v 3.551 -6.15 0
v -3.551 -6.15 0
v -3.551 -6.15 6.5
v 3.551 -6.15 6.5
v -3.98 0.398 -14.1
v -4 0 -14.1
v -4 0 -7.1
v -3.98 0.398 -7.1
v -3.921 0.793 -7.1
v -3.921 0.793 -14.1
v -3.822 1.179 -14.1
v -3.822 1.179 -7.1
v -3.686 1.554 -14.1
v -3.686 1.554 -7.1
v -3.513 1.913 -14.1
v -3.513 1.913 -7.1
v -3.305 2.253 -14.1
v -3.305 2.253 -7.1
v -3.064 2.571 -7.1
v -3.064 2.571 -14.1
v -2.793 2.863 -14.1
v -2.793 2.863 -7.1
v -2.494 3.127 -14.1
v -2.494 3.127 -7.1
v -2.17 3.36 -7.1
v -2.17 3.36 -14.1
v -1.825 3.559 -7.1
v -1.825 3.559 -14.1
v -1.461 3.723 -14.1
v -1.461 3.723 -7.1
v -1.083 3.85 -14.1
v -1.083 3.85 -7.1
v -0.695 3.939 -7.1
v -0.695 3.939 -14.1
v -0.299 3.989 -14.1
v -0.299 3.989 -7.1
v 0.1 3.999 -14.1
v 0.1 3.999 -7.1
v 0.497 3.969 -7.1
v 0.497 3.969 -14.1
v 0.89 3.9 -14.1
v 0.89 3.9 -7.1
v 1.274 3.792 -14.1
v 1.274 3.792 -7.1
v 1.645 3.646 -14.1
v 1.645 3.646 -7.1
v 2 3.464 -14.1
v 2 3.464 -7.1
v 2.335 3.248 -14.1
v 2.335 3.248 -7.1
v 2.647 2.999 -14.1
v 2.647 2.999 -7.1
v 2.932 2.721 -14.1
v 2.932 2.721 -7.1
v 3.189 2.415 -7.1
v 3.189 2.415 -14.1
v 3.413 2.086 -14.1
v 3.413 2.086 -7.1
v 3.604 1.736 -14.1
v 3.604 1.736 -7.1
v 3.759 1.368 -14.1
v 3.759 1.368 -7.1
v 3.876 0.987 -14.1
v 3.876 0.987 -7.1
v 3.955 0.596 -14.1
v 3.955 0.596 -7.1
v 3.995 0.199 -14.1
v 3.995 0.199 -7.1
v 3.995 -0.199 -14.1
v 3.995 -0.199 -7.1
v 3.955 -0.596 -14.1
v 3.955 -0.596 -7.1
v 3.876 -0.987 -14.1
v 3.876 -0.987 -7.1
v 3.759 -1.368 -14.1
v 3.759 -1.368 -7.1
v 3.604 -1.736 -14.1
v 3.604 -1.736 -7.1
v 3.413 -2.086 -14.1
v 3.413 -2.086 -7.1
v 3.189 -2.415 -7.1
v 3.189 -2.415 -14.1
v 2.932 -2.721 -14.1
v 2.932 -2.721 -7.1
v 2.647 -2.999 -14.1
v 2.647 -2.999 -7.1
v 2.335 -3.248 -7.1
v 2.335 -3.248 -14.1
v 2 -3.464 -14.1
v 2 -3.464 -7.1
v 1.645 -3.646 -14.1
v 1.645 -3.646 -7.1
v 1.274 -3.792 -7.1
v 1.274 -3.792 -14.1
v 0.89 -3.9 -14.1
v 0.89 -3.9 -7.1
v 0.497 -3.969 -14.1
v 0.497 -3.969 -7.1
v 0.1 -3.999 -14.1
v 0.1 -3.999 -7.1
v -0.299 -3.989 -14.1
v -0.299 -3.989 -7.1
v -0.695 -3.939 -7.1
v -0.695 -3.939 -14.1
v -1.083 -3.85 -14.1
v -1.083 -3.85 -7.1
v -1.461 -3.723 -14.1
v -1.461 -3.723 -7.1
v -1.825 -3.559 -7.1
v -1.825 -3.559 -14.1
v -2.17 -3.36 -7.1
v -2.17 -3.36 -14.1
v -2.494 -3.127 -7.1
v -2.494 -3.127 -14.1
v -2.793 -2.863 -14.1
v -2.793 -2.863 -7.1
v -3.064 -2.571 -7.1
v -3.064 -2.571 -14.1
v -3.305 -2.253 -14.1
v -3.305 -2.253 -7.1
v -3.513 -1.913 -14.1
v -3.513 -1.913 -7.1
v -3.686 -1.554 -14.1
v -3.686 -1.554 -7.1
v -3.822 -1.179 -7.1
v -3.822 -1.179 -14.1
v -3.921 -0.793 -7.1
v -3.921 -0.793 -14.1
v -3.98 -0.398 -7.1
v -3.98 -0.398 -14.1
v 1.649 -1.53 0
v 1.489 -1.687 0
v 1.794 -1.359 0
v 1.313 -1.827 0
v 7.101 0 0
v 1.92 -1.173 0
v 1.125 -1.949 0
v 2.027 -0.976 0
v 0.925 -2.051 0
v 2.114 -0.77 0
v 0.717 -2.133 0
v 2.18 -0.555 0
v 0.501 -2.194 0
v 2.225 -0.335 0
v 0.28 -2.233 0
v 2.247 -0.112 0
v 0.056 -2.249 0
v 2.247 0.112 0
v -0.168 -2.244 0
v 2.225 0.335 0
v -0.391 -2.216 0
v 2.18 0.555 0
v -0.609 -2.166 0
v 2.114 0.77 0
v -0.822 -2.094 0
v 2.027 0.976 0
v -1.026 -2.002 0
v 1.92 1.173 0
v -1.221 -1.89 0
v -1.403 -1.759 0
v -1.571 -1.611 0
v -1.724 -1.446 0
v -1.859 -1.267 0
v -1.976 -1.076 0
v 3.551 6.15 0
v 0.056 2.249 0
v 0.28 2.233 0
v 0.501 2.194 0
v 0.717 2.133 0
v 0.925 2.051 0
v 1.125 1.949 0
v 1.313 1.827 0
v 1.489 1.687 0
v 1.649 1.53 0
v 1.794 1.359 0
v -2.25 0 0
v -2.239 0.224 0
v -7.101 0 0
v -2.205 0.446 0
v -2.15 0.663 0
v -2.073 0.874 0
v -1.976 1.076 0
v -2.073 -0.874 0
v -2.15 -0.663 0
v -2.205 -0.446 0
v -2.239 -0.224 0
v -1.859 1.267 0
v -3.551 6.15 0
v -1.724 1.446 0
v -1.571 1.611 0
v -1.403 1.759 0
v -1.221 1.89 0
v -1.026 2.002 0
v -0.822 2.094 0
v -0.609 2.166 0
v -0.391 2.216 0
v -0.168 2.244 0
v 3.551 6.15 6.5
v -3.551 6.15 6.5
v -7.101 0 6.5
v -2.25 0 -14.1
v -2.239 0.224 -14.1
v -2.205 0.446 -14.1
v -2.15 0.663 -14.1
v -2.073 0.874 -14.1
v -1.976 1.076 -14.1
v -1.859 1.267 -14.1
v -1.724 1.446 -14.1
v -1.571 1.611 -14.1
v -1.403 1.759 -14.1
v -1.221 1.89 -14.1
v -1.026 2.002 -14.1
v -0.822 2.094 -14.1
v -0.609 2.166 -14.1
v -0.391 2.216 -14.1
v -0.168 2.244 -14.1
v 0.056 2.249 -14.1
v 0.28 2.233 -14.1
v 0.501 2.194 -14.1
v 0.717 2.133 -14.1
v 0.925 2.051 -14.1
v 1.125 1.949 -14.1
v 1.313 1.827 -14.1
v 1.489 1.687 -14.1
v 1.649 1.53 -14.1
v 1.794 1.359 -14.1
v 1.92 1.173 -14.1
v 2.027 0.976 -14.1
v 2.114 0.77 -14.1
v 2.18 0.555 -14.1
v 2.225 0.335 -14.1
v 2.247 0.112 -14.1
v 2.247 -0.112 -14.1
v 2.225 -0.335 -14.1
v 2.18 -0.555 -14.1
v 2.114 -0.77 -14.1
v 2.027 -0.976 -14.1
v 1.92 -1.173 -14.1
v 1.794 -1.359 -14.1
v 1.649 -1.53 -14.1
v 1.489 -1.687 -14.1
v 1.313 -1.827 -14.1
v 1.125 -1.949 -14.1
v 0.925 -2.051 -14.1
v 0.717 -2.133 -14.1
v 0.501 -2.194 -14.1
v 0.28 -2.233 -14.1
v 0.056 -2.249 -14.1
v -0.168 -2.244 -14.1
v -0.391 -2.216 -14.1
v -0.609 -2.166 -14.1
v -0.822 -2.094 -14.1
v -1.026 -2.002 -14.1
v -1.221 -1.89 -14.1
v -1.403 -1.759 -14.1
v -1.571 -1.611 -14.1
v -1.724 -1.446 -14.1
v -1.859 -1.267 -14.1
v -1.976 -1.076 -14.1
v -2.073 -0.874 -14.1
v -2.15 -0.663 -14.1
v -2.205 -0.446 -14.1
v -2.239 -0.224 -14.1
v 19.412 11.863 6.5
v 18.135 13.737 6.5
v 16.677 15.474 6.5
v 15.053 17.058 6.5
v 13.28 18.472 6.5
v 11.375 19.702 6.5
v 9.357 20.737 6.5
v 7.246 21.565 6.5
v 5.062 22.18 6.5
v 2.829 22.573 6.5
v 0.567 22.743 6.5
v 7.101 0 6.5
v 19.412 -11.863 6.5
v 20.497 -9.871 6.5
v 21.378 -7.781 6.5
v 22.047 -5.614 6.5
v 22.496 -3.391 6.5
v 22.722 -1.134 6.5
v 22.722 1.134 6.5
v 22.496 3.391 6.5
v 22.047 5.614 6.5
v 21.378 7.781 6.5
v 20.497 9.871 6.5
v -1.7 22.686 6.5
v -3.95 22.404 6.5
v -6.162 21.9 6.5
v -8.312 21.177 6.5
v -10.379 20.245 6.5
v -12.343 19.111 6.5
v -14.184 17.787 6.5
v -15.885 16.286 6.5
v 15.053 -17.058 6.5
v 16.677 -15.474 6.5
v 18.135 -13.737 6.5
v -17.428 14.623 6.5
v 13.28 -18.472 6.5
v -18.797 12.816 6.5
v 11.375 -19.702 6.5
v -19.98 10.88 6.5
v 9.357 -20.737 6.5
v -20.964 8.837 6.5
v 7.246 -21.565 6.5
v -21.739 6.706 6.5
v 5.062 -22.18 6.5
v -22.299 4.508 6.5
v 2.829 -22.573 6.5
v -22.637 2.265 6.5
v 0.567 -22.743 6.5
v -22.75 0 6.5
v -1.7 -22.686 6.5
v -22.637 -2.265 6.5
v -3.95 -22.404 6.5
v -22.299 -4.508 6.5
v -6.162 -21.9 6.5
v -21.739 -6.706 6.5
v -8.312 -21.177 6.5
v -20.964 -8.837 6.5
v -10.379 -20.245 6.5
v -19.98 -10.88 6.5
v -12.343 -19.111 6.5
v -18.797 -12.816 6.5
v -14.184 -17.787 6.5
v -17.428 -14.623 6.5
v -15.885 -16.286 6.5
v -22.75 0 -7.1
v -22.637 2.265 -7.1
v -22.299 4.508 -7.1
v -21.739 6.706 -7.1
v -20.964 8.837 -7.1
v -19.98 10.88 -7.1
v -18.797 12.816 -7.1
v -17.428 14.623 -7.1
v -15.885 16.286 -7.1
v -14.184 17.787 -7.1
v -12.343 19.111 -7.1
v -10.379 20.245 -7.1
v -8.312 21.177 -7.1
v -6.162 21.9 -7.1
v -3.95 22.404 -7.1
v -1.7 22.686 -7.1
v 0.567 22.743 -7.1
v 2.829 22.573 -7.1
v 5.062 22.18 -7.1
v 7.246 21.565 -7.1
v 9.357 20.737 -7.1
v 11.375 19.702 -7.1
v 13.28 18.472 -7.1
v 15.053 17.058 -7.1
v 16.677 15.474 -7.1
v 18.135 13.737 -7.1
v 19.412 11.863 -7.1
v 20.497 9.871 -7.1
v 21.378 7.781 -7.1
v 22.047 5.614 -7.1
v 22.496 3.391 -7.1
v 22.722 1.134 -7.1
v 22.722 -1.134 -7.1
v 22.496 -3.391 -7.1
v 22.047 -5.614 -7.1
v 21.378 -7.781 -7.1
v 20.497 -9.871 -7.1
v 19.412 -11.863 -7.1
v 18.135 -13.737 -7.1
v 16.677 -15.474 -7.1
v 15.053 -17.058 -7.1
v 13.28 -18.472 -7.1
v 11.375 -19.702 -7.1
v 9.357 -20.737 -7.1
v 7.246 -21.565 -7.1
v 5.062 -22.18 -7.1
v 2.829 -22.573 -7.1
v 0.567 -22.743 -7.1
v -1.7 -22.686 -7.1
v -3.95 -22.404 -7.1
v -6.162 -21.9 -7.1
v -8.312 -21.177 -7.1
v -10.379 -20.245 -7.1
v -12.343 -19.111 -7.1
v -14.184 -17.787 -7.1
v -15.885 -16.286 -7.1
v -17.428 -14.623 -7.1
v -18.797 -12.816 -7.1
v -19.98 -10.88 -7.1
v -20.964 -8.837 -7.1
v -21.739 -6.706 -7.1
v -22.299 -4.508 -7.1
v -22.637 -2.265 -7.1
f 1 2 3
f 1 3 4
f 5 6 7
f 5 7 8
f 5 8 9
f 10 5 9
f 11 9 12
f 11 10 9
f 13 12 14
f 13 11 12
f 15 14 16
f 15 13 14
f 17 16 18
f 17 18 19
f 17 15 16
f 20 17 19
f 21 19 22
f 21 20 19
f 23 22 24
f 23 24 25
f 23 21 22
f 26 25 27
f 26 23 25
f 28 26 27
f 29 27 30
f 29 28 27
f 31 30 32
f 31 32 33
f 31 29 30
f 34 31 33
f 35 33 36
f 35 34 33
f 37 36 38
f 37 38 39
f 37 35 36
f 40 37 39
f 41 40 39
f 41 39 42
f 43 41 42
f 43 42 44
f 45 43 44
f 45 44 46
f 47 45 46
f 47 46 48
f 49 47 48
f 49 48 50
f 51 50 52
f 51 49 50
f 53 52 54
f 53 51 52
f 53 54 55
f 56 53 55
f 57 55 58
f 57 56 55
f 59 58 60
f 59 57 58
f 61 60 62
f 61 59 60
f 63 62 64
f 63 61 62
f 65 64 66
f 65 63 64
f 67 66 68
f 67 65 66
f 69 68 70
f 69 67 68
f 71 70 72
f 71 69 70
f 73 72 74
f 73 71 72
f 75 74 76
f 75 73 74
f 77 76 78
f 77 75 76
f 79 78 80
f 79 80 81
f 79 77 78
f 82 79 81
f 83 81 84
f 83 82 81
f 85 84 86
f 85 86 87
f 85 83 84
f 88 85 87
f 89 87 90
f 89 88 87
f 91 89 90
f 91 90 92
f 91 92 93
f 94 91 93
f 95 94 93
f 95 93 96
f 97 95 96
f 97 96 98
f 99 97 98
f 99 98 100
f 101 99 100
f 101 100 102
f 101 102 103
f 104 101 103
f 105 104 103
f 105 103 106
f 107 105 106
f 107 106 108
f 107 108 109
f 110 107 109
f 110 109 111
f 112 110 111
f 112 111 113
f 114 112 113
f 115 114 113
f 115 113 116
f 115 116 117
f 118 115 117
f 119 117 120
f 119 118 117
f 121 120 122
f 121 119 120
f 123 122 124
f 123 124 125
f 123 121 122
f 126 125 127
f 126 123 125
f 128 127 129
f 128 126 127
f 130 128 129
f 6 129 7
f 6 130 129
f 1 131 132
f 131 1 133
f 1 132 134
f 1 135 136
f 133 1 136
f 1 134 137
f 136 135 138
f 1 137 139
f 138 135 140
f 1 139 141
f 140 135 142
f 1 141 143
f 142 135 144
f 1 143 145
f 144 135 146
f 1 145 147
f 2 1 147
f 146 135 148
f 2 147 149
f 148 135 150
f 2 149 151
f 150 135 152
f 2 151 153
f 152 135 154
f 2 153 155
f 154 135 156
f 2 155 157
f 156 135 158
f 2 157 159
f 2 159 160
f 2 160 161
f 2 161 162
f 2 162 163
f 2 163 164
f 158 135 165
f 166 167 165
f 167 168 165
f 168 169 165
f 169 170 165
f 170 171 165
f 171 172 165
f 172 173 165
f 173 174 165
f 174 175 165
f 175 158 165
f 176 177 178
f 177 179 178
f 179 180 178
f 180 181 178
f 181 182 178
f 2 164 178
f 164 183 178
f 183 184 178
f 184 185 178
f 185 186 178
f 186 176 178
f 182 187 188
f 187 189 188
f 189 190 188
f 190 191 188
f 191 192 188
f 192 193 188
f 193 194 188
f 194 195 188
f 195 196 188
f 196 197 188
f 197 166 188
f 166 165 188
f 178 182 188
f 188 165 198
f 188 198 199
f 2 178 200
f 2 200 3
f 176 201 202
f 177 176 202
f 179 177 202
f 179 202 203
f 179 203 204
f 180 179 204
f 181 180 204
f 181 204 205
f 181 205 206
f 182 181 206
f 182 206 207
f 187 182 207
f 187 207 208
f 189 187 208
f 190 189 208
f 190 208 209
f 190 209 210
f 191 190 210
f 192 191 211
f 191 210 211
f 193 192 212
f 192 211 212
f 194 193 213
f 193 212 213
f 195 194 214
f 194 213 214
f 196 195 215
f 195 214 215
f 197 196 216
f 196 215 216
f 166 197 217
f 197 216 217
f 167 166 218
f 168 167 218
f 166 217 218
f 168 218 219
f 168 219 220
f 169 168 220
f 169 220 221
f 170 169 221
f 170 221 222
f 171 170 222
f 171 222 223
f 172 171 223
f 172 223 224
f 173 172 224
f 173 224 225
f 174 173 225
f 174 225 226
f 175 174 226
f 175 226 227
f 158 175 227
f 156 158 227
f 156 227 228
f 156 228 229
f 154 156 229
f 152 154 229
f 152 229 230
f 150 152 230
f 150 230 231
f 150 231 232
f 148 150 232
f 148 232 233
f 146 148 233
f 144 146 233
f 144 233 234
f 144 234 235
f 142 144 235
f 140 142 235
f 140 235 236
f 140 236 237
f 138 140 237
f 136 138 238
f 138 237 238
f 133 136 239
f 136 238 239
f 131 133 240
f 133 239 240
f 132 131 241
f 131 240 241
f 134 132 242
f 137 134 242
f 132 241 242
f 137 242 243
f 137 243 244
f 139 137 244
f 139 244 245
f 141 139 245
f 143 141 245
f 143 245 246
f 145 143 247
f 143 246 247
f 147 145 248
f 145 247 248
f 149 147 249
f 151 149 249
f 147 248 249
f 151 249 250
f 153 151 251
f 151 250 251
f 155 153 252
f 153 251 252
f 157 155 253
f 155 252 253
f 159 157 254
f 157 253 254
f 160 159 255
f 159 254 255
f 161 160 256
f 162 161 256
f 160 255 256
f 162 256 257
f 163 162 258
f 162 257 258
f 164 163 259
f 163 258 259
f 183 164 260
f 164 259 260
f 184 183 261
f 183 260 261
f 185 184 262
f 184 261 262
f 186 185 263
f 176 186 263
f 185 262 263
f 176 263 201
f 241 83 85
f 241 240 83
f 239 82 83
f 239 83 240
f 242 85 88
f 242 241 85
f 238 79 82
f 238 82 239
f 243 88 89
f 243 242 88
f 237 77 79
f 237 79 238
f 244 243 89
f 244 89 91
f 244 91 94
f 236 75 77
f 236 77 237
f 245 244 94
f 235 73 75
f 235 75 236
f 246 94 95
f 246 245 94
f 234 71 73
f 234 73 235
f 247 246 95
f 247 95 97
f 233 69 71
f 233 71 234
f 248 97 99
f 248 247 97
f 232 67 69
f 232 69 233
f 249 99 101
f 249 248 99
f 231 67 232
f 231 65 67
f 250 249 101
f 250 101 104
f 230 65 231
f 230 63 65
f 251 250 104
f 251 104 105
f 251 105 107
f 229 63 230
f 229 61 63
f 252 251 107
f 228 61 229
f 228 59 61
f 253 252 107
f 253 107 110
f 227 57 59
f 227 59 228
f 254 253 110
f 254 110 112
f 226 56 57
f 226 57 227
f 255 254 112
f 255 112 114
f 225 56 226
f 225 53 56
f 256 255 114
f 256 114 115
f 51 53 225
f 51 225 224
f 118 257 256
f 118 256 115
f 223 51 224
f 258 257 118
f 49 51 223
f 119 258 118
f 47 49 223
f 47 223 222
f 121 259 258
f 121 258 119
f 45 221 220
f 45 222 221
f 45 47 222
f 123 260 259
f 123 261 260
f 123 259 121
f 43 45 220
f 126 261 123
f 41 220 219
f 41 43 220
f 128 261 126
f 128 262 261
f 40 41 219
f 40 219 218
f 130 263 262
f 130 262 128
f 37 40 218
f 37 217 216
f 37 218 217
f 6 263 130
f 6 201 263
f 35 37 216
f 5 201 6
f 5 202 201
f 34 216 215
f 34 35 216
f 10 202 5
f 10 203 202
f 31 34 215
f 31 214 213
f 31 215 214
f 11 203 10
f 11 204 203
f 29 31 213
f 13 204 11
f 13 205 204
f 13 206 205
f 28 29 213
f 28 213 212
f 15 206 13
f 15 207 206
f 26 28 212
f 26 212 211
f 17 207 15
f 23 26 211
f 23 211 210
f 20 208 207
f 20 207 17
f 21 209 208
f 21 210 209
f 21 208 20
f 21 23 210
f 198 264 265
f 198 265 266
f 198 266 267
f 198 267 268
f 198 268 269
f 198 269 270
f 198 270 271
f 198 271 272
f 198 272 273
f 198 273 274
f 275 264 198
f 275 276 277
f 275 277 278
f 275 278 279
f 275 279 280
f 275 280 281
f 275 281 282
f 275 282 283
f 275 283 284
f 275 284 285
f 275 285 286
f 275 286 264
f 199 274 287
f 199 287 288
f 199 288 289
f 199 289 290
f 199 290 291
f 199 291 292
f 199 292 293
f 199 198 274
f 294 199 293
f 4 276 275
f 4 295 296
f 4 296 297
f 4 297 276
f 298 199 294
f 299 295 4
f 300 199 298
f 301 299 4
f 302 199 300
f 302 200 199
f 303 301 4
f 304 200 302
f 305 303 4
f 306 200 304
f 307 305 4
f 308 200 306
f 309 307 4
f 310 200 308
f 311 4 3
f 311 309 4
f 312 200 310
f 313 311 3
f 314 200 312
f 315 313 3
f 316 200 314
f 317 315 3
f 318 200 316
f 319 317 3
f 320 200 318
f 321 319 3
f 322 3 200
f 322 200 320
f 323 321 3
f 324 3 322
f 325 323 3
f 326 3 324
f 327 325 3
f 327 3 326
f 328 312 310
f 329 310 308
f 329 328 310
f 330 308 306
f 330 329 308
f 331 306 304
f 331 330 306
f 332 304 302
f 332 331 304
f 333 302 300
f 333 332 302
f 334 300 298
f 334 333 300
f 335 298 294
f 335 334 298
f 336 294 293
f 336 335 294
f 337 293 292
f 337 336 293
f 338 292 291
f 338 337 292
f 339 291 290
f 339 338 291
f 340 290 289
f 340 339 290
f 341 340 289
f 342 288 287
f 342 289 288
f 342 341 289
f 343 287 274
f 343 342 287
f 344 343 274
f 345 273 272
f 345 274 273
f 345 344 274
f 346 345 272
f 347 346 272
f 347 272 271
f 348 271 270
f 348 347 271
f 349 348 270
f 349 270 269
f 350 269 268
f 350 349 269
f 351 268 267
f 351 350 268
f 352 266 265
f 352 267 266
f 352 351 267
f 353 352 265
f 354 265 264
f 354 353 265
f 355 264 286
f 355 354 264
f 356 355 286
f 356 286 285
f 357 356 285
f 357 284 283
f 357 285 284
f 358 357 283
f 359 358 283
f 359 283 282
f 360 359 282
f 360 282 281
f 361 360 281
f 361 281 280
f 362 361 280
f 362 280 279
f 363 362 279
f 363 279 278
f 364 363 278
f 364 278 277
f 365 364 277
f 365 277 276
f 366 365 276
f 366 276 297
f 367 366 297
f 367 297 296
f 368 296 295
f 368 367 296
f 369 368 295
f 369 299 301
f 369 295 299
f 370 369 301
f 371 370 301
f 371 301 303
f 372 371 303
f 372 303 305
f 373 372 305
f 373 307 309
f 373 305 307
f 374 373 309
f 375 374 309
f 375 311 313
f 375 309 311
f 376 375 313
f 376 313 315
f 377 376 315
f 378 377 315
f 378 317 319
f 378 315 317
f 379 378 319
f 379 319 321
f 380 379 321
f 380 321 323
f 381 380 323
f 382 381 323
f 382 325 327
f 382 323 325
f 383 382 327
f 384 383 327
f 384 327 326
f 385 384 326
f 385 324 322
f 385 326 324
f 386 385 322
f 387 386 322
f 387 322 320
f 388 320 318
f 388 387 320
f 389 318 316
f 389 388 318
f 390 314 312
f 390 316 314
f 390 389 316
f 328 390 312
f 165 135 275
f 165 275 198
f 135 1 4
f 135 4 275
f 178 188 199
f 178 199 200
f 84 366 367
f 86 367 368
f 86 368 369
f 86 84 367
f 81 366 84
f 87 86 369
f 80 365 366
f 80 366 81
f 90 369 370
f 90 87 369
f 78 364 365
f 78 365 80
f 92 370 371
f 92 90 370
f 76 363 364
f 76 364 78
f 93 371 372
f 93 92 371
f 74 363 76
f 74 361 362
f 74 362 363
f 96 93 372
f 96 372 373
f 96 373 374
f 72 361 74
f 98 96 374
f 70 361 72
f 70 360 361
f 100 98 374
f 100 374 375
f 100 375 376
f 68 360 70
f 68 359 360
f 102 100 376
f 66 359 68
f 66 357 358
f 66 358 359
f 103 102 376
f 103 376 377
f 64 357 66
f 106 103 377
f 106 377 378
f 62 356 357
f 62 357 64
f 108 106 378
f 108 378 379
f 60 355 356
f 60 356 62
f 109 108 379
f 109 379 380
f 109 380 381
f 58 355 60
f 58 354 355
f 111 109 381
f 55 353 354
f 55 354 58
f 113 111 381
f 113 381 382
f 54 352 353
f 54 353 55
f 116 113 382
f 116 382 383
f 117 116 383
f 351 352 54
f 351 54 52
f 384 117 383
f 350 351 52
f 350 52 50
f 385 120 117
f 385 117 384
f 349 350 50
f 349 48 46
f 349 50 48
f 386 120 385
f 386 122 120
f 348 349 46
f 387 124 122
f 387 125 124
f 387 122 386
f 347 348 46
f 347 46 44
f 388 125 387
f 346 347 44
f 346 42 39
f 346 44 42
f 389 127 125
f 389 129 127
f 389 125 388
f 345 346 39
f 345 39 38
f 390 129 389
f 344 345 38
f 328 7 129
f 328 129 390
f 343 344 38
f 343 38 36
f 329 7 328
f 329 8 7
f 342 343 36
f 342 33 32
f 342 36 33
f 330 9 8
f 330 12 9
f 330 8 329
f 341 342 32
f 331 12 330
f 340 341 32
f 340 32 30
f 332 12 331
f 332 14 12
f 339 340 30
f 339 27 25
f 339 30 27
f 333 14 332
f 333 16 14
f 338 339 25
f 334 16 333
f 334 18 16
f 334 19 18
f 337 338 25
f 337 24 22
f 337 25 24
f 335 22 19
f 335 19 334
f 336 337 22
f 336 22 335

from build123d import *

# Parameters (mm, degrees)
SKETCH16_R           = 22.75
BOSS_EXTRUDE9_DEPTH  = 6.5
BOSS_EXTRUDE10_START = 7.1
SKETCH18_R           = 22.75
SKETCH18_R_2         = 2.25
BOSS_EXTRUDE10_DEPTH = 7.1
BOSS_EXTRUDE11_START = 7
SKETCH19_R           = 4
SKETCH19_R_2         = 2.25
BOSS_EXTRUDE11_DEPTH = 7


with BuildPart() as part:
    # Sketch16 → Boss-Extrude9 (new body)
    with BuildSketch(Plane.XY):
        with Locations(Location((0, 0, 0), (0, 0, 180))):
            Circle(SKETCH16_R)
        Polygon((7.101408311, 0), (3.550704156, 6.15), (-3.550704156, 6.15), (-7.101408311, 0), (-3.550704156, -6.15), (3.550704156, -6.15), align=None, mode=Mode.SUBTRACT)
    extrude(amount=BOSS_EXTRUDE9_DEPTH)

    # Sketch18 → Boss-Extrude10 (add)
    with BuildSketch(Plane(origin=(0, 0, 0), x_dir=(-1, 0, 0), z_dir=(0, 0, -1)).offset(BOSS_EXTRUDE10_START)):
        Circle(SKETCH18_R)
        Circle(SKETCH18_R_2, mode=Mode.SUBTRACT)
    extrude(amount=-BOSS_EXTRUDE10_DEPTH)

    # Sketch19 → Boss-Extrude11 (add)
    with BuildSketch(Plane(origin=(0, 0, -7.1), x_dir=(-1, 0, 0), z_dir=(0, 0, -1)).offset(BOSS_EXTRUDE11_START)):
        Circle(SKETCH19_R)
        Circle(SKETCH19_R_2, mode=Mode.SUBTRACT)
    extrude(amount=-BOSS_EXTRUDE11_DEPTH)


solid = part.part
